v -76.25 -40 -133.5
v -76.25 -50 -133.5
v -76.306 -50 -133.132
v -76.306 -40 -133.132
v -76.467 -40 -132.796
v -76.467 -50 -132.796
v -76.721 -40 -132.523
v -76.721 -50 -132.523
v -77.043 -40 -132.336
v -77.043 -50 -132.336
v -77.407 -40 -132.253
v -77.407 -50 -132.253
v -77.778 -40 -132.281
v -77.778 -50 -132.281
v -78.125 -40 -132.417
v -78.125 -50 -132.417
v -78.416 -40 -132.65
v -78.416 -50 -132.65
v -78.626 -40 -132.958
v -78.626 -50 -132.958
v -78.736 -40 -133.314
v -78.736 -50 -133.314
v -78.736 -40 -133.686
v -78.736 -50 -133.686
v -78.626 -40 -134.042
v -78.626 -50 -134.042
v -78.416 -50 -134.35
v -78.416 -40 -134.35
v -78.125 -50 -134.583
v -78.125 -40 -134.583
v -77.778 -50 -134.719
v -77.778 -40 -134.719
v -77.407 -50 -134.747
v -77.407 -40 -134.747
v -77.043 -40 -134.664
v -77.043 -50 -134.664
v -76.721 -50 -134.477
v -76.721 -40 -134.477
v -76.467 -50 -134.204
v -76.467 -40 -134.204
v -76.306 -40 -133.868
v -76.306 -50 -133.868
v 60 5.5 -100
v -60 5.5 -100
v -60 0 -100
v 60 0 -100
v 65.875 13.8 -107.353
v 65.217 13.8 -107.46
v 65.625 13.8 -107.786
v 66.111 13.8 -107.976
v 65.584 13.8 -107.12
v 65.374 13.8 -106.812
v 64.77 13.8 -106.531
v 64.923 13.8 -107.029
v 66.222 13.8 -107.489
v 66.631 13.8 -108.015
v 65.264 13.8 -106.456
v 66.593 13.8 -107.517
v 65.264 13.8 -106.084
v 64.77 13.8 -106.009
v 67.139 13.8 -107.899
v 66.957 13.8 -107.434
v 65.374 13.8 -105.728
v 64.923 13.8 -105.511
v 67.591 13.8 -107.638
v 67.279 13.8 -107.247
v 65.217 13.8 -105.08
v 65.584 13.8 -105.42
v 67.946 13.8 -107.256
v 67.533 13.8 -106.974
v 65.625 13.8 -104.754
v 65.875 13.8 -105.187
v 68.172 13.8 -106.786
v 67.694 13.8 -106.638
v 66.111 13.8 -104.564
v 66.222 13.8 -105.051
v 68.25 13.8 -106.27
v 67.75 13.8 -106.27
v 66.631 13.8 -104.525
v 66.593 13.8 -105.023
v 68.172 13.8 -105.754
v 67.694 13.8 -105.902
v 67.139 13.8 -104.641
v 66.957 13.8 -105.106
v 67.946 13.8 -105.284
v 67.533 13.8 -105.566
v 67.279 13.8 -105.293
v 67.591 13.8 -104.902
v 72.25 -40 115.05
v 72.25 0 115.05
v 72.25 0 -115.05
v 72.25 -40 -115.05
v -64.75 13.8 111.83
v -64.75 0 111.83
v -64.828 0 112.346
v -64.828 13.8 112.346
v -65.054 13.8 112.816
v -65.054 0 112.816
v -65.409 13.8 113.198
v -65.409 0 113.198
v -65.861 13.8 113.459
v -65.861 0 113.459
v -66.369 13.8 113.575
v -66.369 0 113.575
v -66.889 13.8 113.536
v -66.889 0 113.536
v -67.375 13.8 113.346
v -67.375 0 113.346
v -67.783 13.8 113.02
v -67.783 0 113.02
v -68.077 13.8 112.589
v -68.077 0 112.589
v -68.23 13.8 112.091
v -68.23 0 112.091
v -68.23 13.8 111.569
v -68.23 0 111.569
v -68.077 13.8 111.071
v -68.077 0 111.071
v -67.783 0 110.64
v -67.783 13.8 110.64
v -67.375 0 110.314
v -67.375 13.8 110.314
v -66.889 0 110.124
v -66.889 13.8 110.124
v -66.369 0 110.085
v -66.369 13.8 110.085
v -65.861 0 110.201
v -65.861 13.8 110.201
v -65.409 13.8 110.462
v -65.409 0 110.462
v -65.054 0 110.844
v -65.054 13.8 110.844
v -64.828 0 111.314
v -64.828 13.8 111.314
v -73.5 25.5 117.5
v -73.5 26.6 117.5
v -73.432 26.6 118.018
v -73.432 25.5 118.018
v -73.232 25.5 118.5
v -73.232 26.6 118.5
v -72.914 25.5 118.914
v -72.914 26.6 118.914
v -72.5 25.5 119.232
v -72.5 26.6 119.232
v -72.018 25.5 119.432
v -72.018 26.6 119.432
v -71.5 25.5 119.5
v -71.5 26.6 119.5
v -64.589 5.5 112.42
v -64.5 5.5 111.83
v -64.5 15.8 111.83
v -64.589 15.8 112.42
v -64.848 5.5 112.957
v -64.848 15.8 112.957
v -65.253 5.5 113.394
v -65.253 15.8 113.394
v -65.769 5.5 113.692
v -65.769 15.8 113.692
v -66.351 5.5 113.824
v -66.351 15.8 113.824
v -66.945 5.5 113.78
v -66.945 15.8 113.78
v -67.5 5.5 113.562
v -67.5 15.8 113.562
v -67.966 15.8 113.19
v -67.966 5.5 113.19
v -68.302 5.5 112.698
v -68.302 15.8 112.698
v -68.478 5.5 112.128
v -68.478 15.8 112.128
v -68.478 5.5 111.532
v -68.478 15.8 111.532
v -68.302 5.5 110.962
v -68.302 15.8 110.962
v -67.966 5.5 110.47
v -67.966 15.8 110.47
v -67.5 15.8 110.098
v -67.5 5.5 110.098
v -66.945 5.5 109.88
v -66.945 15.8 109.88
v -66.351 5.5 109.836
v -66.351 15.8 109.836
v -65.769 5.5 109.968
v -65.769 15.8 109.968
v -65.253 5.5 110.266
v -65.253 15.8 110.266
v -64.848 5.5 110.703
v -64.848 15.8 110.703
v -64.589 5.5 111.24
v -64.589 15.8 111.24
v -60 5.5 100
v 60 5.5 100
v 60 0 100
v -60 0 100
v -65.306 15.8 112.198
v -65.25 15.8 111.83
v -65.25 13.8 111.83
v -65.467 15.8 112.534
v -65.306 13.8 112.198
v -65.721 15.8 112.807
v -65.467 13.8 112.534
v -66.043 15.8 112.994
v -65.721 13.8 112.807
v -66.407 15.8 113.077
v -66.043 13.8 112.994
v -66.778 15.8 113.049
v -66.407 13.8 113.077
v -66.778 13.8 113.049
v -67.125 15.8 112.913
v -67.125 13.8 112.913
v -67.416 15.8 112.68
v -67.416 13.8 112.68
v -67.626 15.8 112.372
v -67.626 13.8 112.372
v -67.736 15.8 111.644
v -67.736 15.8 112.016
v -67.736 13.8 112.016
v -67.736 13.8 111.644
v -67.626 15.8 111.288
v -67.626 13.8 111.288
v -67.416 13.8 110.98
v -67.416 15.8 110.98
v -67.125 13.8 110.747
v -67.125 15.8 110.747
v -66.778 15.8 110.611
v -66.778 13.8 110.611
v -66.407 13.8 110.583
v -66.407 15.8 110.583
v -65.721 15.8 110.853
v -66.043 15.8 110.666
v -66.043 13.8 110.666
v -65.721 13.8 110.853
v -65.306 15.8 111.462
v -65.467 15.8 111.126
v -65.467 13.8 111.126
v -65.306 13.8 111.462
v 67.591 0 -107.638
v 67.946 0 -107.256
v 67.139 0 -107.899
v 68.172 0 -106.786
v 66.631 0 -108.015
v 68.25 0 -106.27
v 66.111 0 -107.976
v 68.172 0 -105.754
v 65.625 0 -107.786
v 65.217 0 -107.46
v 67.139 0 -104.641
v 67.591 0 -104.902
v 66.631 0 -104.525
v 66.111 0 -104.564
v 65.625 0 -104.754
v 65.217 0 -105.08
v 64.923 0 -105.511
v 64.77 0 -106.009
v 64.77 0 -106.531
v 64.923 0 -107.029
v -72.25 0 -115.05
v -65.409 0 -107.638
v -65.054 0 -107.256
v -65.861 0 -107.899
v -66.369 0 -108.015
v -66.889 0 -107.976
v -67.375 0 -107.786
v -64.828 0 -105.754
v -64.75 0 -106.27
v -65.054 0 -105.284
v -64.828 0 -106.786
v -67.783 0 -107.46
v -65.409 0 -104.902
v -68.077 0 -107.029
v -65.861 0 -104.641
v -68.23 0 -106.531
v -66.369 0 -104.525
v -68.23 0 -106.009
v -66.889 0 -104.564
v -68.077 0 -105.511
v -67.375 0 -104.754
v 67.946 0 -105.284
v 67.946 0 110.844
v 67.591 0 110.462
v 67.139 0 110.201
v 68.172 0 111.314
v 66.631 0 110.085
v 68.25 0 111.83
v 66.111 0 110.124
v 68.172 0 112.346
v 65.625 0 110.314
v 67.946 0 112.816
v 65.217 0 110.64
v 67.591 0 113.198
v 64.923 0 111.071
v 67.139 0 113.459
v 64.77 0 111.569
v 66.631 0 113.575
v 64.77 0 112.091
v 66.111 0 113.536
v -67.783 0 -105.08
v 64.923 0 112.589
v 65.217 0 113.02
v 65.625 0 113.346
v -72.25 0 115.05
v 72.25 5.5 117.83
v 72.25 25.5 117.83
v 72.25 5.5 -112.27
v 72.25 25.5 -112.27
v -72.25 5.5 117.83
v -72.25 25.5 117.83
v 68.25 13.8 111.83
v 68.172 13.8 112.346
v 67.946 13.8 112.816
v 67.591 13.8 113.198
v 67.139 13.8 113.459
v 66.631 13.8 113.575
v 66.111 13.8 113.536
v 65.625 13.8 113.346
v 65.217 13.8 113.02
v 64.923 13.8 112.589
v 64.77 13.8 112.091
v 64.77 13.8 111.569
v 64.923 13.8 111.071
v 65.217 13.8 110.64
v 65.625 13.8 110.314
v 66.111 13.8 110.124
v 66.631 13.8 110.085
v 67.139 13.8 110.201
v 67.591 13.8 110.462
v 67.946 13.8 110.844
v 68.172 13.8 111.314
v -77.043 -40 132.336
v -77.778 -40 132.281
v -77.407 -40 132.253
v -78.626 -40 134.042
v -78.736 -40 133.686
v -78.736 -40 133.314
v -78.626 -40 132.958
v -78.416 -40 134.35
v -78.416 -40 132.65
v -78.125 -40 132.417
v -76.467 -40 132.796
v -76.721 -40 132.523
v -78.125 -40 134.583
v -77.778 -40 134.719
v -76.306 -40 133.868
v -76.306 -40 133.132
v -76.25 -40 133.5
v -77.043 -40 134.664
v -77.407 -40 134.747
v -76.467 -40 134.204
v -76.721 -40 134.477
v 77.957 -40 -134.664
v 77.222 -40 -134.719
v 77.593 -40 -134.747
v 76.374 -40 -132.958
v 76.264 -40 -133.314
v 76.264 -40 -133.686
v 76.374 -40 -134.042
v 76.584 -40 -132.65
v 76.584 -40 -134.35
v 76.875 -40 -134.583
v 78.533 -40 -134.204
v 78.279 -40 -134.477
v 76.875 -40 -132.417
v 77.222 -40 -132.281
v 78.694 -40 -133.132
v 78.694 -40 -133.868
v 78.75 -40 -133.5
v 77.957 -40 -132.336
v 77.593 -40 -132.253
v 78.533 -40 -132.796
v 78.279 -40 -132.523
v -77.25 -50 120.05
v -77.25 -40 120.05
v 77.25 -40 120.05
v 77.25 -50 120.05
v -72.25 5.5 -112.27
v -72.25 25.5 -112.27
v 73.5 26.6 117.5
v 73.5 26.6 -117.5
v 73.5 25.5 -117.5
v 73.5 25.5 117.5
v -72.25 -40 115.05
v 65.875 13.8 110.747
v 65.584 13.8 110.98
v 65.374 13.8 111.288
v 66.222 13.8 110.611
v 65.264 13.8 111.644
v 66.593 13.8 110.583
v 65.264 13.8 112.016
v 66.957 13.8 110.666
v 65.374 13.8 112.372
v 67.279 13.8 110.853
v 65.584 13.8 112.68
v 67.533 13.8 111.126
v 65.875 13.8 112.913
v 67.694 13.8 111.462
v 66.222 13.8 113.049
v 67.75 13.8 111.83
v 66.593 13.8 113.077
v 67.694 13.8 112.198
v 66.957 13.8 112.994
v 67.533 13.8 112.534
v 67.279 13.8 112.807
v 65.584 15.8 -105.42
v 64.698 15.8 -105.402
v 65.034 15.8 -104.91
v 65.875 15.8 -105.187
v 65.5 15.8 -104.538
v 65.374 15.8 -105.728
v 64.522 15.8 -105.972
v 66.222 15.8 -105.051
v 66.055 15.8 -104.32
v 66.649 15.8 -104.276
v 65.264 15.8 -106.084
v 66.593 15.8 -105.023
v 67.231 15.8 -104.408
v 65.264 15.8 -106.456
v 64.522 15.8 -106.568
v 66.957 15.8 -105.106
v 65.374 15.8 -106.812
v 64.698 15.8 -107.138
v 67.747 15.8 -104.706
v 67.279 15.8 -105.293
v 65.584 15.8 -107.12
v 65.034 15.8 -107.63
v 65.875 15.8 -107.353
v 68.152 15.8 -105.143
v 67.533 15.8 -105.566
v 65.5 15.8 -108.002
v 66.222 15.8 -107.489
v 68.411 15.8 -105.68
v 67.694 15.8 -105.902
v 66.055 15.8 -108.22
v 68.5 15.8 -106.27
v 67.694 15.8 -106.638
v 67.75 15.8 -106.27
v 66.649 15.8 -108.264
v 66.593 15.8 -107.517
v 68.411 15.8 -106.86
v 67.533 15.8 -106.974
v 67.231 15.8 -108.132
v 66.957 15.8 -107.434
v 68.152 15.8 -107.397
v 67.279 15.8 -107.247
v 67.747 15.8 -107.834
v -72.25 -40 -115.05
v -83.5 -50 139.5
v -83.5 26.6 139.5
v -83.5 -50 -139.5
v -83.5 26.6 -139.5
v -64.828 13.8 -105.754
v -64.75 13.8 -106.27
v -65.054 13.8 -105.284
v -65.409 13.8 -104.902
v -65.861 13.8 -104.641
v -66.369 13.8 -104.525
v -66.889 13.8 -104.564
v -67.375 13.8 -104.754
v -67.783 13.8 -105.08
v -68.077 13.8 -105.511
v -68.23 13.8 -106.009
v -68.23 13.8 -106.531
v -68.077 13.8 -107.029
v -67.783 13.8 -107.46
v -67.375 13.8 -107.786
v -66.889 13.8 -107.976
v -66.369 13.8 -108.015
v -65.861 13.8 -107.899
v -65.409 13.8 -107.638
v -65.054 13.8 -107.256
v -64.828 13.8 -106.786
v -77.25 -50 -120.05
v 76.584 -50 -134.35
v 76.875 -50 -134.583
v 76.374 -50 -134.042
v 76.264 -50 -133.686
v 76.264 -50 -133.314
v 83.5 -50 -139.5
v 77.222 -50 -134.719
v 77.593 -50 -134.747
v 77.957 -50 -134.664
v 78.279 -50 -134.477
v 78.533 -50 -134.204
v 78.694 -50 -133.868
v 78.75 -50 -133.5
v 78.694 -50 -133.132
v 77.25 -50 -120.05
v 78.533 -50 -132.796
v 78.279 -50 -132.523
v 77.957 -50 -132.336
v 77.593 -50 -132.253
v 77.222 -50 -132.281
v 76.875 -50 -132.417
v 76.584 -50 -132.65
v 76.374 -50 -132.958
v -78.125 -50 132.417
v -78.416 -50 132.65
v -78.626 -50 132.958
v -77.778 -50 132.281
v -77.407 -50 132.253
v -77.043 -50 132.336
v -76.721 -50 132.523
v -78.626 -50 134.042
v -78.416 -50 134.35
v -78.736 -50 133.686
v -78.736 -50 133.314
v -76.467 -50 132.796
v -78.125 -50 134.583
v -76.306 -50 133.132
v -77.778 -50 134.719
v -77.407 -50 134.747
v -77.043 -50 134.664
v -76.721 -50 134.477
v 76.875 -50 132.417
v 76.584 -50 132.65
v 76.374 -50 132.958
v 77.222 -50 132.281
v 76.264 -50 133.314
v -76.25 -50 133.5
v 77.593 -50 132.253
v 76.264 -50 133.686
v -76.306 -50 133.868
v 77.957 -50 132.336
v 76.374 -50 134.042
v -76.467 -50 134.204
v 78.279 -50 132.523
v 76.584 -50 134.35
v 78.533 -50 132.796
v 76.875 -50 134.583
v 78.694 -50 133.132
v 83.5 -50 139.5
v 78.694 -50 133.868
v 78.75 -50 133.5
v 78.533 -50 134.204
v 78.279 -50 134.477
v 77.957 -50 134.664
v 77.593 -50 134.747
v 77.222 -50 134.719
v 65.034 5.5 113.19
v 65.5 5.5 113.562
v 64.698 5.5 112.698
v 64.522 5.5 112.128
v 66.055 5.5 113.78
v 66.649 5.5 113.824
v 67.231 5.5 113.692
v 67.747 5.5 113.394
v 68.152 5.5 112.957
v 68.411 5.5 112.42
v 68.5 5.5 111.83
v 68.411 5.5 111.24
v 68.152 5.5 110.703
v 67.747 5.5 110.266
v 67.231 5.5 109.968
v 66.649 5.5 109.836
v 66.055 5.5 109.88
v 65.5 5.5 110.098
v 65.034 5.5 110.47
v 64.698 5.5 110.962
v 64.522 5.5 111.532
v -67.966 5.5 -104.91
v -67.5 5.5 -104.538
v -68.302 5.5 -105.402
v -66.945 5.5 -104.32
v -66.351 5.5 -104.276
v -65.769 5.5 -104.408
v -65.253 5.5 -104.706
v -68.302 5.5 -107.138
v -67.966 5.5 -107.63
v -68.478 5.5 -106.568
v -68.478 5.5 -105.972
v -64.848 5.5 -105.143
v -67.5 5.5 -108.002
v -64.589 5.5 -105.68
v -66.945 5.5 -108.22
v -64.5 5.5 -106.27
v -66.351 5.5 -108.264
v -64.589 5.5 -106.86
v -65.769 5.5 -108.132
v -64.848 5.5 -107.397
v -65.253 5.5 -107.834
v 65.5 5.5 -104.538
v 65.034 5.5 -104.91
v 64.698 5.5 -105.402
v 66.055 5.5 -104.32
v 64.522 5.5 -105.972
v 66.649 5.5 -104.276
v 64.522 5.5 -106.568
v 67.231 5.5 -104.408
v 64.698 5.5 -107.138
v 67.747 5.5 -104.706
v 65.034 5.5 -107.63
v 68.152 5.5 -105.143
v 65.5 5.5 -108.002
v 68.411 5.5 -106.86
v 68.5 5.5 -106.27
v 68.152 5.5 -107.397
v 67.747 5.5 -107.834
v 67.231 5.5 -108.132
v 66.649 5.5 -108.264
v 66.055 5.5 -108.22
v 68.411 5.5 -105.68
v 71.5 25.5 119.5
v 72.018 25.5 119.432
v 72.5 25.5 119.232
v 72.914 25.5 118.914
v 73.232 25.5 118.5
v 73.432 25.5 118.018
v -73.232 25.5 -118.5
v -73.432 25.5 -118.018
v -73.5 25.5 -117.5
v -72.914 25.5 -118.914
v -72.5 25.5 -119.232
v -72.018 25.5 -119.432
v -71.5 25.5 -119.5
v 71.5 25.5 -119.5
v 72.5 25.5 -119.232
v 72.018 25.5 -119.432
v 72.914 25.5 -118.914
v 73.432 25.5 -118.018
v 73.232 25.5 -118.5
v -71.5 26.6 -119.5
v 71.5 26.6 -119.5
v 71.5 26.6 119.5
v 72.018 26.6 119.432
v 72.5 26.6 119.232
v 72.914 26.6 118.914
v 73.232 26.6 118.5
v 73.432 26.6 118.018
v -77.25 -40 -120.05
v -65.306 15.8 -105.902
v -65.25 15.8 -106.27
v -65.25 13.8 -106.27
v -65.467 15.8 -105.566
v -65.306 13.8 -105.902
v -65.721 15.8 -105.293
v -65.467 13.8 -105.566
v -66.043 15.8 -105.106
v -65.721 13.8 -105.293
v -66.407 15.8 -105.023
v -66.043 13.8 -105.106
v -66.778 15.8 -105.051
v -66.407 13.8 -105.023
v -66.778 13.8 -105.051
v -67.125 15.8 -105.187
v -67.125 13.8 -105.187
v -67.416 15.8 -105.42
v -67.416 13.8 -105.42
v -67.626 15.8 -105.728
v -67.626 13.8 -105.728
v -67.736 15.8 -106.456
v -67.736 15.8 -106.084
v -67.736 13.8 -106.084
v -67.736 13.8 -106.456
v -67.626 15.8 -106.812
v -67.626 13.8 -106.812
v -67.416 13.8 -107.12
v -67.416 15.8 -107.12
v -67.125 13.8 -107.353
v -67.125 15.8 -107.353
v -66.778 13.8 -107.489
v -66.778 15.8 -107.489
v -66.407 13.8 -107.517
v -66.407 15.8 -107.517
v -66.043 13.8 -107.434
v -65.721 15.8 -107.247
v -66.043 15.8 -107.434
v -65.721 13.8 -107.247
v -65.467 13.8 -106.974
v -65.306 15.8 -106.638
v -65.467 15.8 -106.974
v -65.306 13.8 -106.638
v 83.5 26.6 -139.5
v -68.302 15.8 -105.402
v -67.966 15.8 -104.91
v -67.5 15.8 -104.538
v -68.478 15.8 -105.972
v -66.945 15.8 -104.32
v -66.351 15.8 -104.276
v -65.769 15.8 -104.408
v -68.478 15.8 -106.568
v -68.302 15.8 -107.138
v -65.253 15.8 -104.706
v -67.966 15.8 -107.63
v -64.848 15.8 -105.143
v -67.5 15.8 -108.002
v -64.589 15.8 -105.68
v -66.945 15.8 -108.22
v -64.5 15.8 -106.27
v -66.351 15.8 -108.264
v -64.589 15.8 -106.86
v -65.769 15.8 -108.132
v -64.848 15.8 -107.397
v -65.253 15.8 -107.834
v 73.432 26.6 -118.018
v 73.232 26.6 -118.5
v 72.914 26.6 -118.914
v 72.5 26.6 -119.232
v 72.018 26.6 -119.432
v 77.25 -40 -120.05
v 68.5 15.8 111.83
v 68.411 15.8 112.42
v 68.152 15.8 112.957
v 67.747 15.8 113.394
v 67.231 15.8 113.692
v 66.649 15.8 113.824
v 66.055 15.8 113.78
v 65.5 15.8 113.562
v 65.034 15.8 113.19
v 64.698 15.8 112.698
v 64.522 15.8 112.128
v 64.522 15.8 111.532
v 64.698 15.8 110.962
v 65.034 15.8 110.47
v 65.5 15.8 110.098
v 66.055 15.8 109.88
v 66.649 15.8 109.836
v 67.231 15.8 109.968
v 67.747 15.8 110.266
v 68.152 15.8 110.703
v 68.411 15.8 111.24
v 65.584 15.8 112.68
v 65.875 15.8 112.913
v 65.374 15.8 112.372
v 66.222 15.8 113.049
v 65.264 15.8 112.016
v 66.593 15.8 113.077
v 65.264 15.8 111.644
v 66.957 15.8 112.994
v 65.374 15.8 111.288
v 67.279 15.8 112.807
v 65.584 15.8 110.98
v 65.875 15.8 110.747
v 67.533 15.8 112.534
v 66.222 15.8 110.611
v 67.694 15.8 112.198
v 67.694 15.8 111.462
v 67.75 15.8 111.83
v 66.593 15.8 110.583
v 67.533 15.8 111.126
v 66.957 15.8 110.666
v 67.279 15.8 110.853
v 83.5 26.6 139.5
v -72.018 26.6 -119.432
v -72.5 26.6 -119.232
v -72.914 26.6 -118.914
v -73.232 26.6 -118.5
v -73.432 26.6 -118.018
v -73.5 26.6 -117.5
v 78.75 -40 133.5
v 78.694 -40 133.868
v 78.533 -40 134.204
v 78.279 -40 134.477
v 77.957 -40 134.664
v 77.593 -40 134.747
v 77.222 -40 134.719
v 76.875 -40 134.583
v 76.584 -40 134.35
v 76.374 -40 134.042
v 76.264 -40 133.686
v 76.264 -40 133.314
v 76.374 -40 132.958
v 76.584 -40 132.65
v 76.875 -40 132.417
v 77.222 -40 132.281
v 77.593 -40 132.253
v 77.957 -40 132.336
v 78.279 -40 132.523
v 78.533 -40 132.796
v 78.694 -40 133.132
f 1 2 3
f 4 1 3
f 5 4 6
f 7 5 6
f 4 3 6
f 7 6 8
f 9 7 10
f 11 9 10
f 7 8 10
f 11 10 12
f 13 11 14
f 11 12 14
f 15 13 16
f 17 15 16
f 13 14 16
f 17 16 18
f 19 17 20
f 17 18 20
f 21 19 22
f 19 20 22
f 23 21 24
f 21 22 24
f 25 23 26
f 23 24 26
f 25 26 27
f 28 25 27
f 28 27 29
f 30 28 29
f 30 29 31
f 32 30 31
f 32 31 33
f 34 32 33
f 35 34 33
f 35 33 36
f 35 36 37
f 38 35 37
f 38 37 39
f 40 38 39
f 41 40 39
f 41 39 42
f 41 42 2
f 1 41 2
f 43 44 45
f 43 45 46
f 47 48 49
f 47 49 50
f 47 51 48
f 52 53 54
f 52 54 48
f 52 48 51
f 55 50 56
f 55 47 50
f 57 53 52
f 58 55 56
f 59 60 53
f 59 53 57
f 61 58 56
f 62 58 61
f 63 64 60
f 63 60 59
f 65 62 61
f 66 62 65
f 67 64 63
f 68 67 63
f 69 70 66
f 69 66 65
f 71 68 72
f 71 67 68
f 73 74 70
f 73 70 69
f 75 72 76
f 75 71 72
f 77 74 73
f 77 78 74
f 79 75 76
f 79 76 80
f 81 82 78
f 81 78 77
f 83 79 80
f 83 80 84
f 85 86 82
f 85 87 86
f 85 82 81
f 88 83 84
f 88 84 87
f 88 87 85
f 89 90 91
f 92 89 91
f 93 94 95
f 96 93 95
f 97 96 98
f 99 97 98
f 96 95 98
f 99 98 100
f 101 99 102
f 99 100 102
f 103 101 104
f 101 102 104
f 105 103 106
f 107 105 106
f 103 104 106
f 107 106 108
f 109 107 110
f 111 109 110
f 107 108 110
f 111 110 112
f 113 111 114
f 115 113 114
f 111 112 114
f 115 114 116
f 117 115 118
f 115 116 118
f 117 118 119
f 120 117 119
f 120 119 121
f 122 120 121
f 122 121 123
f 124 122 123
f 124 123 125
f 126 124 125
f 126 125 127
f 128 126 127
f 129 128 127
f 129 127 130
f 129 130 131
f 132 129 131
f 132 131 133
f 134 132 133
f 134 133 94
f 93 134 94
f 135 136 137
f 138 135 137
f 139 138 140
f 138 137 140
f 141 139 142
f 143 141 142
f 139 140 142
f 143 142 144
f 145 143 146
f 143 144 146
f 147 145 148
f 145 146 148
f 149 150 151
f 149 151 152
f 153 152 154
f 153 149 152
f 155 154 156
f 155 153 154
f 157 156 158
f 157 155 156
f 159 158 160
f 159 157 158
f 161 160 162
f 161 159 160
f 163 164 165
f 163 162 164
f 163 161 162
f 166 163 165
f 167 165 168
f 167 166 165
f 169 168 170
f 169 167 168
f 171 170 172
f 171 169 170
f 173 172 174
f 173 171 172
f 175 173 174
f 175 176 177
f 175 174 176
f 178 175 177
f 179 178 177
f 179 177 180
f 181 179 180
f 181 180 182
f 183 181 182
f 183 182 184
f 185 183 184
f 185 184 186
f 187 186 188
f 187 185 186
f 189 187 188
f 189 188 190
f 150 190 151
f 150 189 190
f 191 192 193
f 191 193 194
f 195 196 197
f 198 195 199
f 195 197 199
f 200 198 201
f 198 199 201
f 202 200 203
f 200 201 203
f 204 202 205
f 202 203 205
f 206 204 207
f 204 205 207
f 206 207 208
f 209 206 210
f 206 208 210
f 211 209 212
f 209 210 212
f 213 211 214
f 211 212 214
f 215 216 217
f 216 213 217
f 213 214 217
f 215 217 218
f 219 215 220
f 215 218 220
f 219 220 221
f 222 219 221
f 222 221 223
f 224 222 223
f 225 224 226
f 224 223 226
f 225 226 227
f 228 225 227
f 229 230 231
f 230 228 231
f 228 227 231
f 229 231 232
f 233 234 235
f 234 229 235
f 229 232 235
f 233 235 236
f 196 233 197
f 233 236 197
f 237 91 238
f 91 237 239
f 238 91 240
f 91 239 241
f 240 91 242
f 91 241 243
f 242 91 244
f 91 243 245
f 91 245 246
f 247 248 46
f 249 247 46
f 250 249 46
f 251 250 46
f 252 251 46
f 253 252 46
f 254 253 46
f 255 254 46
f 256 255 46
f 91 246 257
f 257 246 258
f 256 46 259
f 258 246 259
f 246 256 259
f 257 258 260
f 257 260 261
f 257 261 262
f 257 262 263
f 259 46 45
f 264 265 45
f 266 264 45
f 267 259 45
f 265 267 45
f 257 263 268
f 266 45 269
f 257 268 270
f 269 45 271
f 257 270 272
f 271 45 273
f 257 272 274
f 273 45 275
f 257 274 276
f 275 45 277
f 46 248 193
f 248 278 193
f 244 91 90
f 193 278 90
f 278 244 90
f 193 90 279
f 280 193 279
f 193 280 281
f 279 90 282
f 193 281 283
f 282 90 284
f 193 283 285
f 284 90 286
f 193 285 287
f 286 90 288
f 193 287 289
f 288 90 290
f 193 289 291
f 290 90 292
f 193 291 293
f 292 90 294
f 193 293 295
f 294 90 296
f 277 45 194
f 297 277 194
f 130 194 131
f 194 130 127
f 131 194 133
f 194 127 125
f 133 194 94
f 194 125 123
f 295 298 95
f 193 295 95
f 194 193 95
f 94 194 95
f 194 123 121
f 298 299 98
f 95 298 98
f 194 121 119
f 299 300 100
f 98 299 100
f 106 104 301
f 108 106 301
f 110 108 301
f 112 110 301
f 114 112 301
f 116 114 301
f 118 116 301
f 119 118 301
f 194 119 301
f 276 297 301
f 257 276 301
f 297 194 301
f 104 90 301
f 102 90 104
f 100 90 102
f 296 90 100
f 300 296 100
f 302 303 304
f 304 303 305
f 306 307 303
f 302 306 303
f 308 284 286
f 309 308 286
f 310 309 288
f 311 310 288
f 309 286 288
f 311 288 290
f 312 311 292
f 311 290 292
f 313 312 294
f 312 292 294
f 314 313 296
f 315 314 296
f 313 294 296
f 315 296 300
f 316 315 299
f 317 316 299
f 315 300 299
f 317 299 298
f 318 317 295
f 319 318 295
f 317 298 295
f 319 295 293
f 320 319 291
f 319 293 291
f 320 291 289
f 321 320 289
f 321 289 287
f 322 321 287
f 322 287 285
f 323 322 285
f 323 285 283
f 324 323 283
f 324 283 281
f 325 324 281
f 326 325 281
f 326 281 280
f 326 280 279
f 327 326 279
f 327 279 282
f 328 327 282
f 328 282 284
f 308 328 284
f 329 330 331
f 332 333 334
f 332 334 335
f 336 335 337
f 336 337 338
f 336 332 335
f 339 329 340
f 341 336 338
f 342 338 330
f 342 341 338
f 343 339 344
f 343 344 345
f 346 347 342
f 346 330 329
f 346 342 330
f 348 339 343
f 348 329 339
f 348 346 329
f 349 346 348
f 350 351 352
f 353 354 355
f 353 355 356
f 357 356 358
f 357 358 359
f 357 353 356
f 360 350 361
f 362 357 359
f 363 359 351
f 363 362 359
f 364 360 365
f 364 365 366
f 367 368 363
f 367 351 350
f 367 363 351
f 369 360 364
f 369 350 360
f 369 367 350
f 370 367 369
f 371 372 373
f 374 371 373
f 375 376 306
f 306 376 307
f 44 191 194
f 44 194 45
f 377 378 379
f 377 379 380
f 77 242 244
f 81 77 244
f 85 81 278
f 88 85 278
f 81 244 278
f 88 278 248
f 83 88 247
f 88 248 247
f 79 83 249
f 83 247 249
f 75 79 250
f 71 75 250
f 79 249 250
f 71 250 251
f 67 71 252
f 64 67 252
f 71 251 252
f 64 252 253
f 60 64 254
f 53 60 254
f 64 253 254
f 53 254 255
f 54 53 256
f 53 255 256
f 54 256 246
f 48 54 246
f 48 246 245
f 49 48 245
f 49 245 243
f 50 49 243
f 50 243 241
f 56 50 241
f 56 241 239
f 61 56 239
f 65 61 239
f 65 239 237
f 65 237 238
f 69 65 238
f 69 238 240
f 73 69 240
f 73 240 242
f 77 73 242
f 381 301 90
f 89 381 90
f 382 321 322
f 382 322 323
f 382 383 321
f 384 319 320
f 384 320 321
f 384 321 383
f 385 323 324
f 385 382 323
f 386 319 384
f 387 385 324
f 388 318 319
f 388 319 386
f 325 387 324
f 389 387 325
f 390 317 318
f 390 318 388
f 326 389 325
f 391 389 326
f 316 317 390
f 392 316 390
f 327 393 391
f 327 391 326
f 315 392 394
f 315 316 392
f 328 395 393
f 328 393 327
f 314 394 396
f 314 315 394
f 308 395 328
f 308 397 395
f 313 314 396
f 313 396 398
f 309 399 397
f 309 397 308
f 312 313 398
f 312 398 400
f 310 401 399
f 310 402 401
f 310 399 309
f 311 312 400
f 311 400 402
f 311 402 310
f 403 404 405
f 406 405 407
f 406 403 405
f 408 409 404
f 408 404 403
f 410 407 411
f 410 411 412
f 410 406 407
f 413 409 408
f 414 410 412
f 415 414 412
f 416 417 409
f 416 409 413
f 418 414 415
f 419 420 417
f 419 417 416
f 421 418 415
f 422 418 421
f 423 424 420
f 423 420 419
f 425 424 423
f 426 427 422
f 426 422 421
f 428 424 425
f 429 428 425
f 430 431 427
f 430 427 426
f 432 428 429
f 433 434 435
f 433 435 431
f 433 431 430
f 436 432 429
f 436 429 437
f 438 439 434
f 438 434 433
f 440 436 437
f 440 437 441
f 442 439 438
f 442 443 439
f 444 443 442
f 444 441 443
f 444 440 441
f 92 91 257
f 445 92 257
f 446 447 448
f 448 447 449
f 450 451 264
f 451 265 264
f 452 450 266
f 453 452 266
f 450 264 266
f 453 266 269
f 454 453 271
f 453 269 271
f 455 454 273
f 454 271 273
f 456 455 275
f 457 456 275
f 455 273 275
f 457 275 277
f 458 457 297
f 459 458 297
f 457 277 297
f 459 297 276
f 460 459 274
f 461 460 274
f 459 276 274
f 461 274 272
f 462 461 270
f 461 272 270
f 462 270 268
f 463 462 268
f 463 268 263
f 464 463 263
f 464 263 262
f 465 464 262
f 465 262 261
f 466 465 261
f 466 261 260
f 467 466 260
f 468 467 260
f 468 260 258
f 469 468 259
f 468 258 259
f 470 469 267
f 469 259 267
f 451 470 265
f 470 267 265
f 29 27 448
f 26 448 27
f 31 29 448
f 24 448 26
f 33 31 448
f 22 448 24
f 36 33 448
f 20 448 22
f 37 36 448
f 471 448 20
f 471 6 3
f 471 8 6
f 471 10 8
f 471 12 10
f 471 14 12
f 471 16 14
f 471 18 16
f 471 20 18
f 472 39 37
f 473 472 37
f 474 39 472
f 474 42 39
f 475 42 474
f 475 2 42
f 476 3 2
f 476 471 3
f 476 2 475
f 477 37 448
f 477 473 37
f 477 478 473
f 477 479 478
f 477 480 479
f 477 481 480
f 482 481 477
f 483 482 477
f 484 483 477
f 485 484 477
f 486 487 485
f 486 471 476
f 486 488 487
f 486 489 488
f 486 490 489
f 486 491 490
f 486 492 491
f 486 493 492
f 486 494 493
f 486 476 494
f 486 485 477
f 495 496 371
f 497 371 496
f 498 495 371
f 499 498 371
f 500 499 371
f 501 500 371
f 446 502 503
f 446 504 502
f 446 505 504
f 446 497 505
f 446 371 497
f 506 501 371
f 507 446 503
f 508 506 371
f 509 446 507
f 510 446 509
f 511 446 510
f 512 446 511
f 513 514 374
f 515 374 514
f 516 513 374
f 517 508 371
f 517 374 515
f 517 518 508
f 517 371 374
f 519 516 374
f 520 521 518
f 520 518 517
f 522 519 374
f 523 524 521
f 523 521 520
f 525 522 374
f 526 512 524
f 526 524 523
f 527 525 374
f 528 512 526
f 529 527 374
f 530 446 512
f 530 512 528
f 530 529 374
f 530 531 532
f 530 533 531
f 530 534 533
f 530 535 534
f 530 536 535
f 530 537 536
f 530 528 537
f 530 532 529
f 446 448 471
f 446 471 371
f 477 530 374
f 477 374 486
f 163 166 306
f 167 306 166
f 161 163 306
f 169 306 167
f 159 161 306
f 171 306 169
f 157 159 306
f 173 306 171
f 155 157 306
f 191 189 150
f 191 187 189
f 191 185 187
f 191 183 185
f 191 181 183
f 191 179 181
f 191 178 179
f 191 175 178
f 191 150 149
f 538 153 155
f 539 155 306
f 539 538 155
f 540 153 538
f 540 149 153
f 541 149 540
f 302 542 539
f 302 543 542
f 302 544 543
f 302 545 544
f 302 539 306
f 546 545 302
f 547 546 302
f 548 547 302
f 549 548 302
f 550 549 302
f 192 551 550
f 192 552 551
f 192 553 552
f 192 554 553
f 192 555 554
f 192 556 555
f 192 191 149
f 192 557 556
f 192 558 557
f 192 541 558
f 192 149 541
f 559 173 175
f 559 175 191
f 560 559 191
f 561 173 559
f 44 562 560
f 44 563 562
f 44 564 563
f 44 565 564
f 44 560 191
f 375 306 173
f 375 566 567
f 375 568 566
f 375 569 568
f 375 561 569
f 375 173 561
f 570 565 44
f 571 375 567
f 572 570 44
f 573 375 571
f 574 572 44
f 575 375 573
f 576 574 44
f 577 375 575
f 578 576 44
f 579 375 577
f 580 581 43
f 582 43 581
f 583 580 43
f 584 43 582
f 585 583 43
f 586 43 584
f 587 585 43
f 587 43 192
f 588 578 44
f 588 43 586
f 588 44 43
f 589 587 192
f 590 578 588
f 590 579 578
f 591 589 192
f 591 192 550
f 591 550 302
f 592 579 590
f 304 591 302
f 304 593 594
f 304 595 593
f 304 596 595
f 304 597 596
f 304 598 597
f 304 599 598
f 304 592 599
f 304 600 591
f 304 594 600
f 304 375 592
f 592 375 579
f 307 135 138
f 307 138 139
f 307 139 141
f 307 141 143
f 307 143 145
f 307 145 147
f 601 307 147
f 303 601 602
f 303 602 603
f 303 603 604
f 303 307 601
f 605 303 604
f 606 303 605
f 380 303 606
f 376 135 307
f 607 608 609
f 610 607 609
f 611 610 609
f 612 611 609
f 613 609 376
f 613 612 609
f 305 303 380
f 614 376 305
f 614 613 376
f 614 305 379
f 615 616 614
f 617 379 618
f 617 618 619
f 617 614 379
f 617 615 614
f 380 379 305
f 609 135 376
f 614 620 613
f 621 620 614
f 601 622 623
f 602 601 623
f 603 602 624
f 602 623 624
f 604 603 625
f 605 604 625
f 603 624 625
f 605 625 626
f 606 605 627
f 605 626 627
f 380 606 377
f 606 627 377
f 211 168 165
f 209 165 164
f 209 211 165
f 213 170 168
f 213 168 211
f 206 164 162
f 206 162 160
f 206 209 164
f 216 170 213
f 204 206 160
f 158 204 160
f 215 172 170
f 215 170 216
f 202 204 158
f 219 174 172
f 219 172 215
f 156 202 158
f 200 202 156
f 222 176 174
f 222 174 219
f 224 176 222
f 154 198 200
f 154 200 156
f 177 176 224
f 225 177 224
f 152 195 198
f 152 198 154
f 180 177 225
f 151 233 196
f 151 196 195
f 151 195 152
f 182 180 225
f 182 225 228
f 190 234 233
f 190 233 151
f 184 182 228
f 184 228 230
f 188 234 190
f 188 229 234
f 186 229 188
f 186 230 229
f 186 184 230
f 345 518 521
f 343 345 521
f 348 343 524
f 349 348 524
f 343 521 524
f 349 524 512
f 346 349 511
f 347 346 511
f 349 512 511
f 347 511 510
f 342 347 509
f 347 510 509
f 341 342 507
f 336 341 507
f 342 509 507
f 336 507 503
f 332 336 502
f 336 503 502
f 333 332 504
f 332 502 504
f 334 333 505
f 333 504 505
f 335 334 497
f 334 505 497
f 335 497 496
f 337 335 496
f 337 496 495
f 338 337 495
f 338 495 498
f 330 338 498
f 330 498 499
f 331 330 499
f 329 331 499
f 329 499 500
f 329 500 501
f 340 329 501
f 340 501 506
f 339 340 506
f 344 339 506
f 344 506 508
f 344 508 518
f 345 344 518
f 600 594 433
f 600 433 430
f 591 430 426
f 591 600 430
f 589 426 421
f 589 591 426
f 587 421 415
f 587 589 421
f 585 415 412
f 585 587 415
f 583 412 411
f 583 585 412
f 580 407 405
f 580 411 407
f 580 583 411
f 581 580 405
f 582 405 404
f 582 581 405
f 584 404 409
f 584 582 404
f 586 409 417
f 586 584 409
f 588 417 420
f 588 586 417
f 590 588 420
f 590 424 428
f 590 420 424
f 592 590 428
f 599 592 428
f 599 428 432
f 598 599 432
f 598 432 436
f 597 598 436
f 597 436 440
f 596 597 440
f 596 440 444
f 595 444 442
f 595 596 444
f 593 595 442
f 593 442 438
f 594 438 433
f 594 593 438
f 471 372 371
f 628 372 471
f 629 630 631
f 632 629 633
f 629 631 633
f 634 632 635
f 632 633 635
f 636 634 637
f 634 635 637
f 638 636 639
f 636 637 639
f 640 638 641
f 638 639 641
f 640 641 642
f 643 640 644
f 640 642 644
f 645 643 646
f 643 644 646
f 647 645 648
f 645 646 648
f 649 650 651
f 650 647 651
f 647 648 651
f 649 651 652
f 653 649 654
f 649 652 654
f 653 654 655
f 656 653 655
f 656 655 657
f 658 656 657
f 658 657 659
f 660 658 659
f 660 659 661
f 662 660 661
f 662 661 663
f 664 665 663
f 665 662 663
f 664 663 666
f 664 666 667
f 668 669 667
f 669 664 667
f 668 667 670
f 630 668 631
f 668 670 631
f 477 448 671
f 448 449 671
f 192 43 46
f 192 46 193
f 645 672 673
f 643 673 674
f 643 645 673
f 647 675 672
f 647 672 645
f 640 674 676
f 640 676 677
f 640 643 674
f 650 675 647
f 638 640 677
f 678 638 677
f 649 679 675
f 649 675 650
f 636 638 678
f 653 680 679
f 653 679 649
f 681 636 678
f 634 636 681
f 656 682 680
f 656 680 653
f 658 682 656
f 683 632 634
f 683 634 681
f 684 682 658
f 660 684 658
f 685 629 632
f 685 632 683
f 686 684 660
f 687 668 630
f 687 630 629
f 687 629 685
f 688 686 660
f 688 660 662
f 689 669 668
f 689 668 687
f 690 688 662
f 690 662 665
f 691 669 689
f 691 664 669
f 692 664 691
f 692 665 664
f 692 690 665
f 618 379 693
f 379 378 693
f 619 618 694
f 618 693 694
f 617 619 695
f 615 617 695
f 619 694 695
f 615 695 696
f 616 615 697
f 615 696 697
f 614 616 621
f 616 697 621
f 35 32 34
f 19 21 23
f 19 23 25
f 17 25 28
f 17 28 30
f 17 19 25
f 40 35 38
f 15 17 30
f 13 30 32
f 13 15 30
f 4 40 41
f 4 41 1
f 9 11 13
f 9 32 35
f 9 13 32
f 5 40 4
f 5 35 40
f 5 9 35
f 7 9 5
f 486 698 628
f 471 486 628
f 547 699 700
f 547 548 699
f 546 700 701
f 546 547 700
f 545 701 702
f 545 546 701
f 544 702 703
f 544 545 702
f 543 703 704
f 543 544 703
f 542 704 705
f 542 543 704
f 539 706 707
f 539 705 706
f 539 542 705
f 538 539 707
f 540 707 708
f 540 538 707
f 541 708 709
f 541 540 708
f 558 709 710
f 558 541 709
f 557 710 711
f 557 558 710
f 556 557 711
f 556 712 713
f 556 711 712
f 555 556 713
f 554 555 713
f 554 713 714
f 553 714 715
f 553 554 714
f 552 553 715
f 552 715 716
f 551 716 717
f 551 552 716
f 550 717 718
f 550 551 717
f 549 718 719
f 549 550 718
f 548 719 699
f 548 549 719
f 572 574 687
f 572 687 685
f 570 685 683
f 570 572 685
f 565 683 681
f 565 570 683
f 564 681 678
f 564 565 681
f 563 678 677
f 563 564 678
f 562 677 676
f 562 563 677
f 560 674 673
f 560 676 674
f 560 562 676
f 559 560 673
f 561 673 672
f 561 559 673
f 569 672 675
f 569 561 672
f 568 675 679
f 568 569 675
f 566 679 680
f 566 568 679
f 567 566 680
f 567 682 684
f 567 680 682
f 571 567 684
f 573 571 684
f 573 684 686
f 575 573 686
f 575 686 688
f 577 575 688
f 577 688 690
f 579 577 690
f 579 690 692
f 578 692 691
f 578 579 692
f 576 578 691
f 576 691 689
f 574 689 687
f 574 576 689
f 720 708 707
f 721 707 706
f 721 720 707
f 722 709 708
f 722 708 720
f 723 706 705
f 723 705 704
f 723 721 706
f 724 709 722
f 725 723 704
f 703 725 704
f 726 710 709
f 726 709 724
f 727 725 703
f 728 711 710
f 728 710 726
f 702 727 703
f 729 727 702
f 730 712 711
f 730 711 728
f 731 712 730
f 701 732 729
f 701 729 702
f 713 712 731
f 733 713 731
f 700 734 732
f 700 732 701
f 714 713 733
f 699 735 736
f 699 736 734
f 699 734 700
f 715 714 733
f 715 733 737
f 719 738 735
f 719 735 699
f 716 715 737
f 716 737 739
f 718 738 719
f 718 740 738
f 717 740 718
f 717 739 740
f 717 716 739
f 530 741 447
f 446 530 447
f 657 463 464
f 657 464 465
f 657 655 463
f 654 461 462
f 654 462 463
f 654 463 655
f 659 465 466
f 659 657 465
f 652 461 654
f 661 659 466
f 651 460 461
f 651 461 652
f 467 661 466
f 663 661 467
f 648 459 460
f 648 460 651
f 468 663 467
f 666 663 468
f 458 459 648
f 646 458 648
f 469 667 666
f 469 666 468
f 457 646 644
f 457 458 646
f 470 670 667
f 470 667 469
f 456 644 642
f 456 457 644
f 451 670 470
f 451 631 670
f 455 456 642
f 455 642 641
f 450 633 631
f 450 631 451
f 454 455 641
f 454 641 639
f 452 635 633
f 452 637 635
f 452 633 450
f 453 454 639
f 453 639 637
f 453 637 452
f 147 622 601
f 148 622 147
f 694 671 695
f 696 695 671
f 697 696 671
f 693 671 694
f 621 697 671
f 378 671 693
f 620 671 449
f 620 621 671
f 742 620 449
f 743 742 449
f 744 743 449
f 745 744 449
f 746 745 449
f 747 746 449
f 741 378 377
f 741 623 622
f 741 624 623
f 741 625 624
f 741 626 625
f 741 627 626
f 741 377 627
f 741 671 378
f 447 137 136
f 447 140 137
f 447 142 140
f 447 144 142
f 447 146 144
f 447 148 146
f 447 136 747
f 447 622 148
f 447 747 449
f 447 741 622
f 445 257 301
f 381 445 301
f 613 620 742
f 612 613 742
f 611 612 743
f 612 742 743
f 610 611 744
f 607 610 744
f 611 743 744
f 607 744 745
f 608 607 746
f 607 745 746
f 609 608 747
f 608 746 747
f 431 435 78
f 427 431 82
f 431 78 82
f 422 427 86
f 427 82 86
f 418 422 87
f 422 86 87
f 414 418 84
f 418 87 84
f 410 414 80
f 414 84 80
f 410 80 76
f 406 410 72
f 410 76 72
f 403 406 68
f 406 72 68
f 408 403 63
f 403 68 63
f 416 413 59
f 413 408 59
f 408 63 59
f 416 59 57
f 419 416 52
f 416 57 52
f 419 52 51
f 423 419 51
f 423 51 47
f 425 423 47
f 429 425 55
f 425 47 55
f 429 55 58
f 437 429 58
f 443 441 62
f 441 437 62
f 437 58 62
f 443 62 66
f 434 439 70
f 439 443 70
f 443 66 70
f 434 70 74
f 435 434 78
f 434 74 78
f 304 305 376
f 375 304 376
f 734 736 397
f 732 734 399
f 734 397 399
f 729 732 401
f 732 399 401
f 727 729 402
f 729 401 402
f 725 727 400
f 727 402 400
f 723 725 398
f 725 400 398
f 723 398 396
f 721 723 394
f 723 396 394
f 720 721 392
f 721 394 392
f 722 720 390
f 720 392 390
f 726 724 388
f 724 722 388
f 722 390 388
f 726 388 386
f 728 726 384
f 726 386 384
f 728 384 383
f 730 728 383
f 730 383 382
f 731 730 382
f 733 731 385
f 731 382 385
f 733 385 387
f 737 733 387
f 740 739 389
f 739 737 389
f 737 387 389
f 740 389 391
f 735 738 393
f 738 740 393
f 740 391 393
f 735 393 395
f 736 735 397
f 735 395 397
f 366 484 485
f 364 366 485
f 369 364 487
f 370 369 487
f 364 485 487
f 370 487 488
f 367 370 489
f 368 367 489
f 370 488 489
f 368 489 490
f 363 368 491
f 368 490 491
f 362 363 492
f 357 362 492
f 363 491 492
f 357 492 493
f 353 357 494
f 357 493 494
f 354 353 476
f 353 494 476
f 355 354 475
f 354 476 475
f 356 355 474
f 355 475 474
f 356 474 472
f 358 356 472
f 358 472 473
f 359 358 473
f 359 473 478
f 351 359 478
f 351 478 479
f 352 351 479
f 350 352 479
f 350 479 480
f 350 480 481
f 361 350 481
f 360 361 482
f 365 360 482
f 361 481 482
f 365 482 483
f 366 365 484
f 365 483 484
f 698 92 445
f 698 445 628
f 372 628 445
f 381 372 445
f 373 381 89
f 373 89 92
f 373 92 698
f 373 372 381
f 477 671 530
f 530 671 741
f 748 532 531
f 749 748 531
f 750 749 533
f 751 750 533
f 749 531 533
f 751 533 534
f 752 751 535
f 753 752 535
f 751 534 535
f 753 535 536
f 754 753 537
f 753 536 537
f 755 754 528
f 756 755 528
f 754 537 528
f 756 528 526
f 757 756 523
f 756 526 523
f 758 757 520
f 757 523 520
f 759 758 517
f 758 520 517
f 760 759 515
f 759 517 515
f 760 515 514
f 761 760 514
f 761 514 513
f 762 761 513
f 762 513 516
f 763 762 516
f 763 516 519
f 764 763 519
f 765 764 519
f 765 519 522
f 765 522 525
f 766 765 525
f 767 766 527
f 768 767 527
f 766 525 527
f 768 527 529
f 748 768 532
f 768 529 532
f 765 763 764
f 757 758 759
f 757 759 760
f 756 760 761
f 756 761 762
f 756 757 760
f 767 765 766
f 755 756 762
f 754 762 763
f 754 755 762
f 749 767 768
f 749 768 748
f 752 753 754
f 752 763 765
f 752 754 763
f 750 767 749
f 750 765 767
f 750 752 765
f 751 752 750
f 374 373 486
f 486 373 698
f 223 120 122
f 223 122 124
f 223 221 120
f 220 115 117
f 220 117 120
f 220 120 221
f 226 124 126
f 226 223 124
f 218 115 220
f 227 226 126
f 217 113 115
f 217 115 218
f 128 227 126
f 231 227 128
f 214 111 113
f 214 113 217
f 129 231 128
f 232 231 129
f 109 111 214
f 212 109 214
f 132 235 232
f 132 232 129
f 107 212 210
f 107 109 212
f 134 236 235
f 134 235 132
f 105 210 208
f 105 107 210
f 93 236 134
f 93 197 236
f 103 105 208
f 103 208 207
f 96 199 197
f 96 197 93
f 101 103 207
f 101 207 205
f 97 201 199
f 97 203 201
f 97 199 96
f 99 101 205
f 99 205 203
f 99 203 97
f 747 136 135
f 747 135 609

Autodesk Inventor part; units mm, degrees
ref_plane "YZ Plane" through (0, 0, 0) normal (1, 0, 0) x (0, 1, 0)
ref_plane "XZ Plane" through (0, 0, 0) normal (0, 1, 0) x (-1, 0, 0)
ref_plane "XY Plane" through (0, 0, 0) normal (0, 0, 1) x (1, 0, 0)
sketch "Sketch1" plane through (0, 0, 0) normal (0, 1, 0) x (-1, 0, 0)
  line L0 (-83.5, 139.5) -> (83.5, 139.5)
  line L1 (83.5, 139.5) -> (83.5, -139.5)
  line L2 (83.5, -139.5) -> (-83.5, -139.5)
  line L3 (-83.5, -139.5) -> (-83.5, 139.5)
  line L4 (-83.5, 139.5) -> (83.5, -139.5) construction
  line L5 (83.5, 139.5) -> (-83.5, -139.5) construction
  point P0 (0, 0)
  dimension "d0" = 167
  dimension "d1" = 279
extrude "Extrusion1" add sketch "Sketch1" along normal blind 26.6
sketch "Sketch2" plane through (0, 26.6, 0) normal (0, 1, 0) x (1, 0, 0)
  line L0 (71.5, -119.5) -> (-71.5, -119.5)
  line L1 (-73.5, -117.5) -> (-73.5, 117.5)
  line L2 (-71.5, 119.5) -> (71.5, 119.5)
  line L3 (73.5, 117.5) -> (73.5, -117.5)
  line L4 (73.5, -119.5) -> (-73.5, 119.5) construction
  line L5 (-73.5, -119.5) -> (73.5, 119.5) construction
  arc A0 (-73.5, -117.5) -> (-71.5, -119.5) centre (-71.5, -117.5) ccw
  arc A1 (-71.5, 119.5) -> (-73.5, 117.5) centre (-71.5, 117.5) ccw
  arc A2 (73.5, 117.5) -> (71.5, 119.5) centre (71.5, 117.5) ccw
  arc A3 (71.5, -119.5) -> (73.5, -117.5) centre (71.5, -117.5) ccw
  point P0 (0, 0)
  dimension "d4" = 147
  dimension "d5" = 239
  dimension "d6" = 2
extrude "Extrusion2" cut sketch "Sketch2" against normal blind 1.1
sketch "Sketch3" plane through (0, 25.5, 0) normal (0, 1, 0) x (1, 0, 0)
  line L0 (-73.5, -117.5) -> (-73.5, 117.5) projected
  line L1 (71.5, -119.5) -> (-71.5, -119.5) projected
  line L2 (-72.25, -117.83) -> (72.25, -117.83)
  line L3 (72.25, -117.83) -> (72.25, 112.27)
  line L4 (72.25, 112.27) -> (-72.25, 112.27)
  line L5 (-72.25, 112.27) -> (-72.25, -117.83)
  point P0 (0, 0)
  dimension "d9" = 1.25
  dimension "d10" = 1.67
  dimension "d11" = 144.5
  dimension "d12" = 230.1
extrude "Extrusion3" cut sketch "Sketch3" against normal blind 20
sketch "Sketch4" plane through (0, 5.5, 0) normal (0, 1, 0) x (1, 0, 0)
  circle A0 centre (-66.5, -111.83) radius 2
  line L0 (72.25, -117.83) -> (-72.25, -117.83) projected
  line L1 (-72.25, -117.83) -> (-72.25, 112.27) projected
  circle A1 centre (66.5, -111.83) radius 2
  line L2 (72.25, 112.27) -> (72.25, -117.83) projected
  circle A2 centre (-66.5, 106.27) radius 2
  line L3 (-72.25, 112.27) -> (72.25, 112.27) projected
  circle A3 centre (66.5, 106.27) radius 2
  point P0 (0, 0)
  dimension "d15" = 4
  dimension "d16" = 6
  dimension "d17" = 5.75
  dimension "d18" = 4
  dimension "d19" = 6
  dimension "d20" = 5.75
  dimension "d21" = 4
  dimension "d22" = 5.75
  dimension "d23" = 6
  dimension "d24" = 4
  dimension "d25" = 6
  dimension "d26" = 5.75
extrude "Extrusion4" add sketch "Sketch4" along normal blind 10.3 contours A0 | A1 | A2 | A3
sketch "Sketch5" plane through (0, 5.5, 0) normal (0, 1, 0) x (1, 0, 0)
  circle A0 centre (-66.5, -111.83) radius 2 projected
  circle A1 centre (-66.5, -111.83) radius 1.25
  circle A2 centre (-66.5, 106.27) radius 2 projected
  circle A3 centre (-66.5, 106.27) radius 1.25
  circle A4 centre (66.5, 106.27) radius 2 projected
  circle A5 centre (66.5, 106.27) radius 1.25
  circle A6 centre (66.5, -111.83) radius 1.25
  point P0 (0, 0)
  dimension "d29" = 2.5
  dimension "d30" = 2.5
  dimension "d31" = 2.5
  dimension "d32" = 2.5
extrude "Extrusion5" cut sketch "Sketch5" along normal blind 10.3 and the other way blind 5.5 contours A1 | A3 | A5 | A6
sketch "Sketch8" plane through (0, 0, 0) normal (0, -1, 0) x (1, 0, 0)
  circle A0 centre (66.5, 111.83) radius 1.25 projected
  circle A1 centre (66.5, 111.83) radius 1.75
  circle A2 centre (66.5, -106.27) radius 1.25 projected
  circle A3 centre (66.5, -106.27) radius 1.75
  circle A4 centre (-66.5, -106.27) radius 1.25 projected
  circle A5 centre (-66.5, -106.27) radius 1.75
  circle A6 centre (-66.5, 111.83) radius 1.75
  point P0 (0, 0)
  dimension "d49" = 3.5
  dimension "d50" = 3.5
  dimension "d51" = 3.5
  dimension "d52" = 3.5
extrude "Extrusion8" cut sketch "Sketch8" against normal blind 13.8
sketch "Sketch9" plane through (0, 5.5, 0) normal (0, 1, 0) x (1, 0, 0)
  line L0 (60, -100) -> (-60, -100)
  line L1 (-60, -100) -> (-60, 100)
  line L2 (-60, 100) -> (60, 100)
  line L3 (60, 100) -> (60, -100)
  line L4 (60, -100) -> (-60, 100) construction
  line L5 (-60, -100) -> (60, 100) construction
  point P0 (0, 0)
  dimension "d55" = 120
  dimension "d56" = 200
extrude "Extrusion9" cut sketch "Sketch9" against normal blind 5.8
sketch "Sketch10" plane through (0, 0, 0) normal (0, -1, 0) x (1, 0, 0)
  line L0 (83.5, 139.5) -> (83.5, -139.5) projected
  line L1 (-83.5, -139.5) -> (-83.5, 139.5) projected
  line L2 (83.5, 139.5) -> (-83.5, 139.5)
  line L3 (-83.5, 139.5) -> (-83.5, -139.5)
  line L4 (-83.5, -139.5) -> (83.5, -139.5)
  line L5 (83.5, -139.5) -> (83.5, 139.5)
  line L6 (72.25, -115.05) -> (-72.25, -115.05)
  line L7 (-72.25, -115.05) -> (-72.25, 115.05)
  line L8 (-72.25, 115.05) -> (72.25, 115.05)
  line L9 (72.25, 115.05) -> (72.25, -115.05)
  line L10 (72.25, -115.05) -> (-72.25, 115.05) construction
  line L11 (-72.25, -115.05) -> (72.25, 115.05) construction
  line L12 (-83.5, -139.5) -> (83.5, -139.5)
  line L13 (83.5, -139.5) -> (83.5, 139.5)
  line L14 (83.5, 139.5) -> (-83.5, 139.5)
  line L15 (-83.5, 139.5) -> (-83.5, -139.5)
  point P0 (0, 0)
  point P1 (71.5, 119.5)
  dimension "d67" = 144.5
  dimension "d68" = 230.1
extrude "Extrusion10" add sketch "Sketch10" along normal blind 40
sketch "Sketch12" plane through (0, -40, 0) normal (0, -1, 0) x (1, 0, 0)
  line L0 (-72.25, -115.05) -> (-72.25, 115.05) projected
  line L1 (72.25, -115.05) -> (-72.25, -115.05) projected
  line L2 (-77.25, -120.05) -> (-72.25, -120.05)
  line L3 (-72.25, -120.05) -> (-72.25, 120.05)
  line L4 (-72.25, 120.05) -> (-77.25, 120.05)
  line L5 (-77.25, 120.05) -> (-77.25, -120.05)
  line L6 (72.25, 115.05) -> (72.25, -115.05) projected
  line L7 (77.25, -120.05) -> (72.25, -120.05)
  line L8 (72.25, -120.05) -> (72.25, 120.05)
  line L9 (72.25, 120.05) -> (77.25, 120.05)
  line L10 (77.25, 120.05) -> (77.25, -120.05)
  line L11 (72.25, 115.05) -> (-72.25, 115.05) projected
  line L12 (72.25, 120.05) -> (-72.25, 120.05)
  line L13 (-72.25, 120.05) -> (-72.25, 115.05)
  line L14 (-72.25, 115.05) -> (72.25, 115.05)
  line L15 (72.25, 115.05) -> (72.25, 120.05)
  line L16 (-83.5, 139.5) -> (-83.5, -139.5) projected
  line L17 (83.5, 139.5) -> (-83.5, 139.5) projected
  line L18 (-83.5, -139.5) -> (83.5, -139.5)
  line L19 (83.5, -139.5) -> (83.5, 139.5)
  line L20 (83.5, 139.5) -> (-83.5, 139.5)
  line L21 (-83.5, 139.5) -> (-83.5, -139.5)
  line L22 (-72.25, -115.05) -> (72.25, -115.05) projected
  line L23 (-72.25, -115.05) -> (72.25, -115.05)
  line L24 (72.25, -115.05) -> (72.25, -120.05)
  line L25 (72.25, -120.05) -> (-72.25, -120.05)
  line L26 (-72.25, -120.05) -> (-72.25, -115.05)
  point P0 (0, 0)
  dimension "d69" = 5
  dimension "d70" = 5
  dimension "d71" = 240.1
  dimension "d72" = 5
  dimension "d73" = 5
  dimension "d74" = 240.1
extrude "Extrusion11" add sketch "Sketch12" along normal blind 10
sketch "Sketch13" plane through (0, -50, 0) normal (0, -1, 0) x (1, 0, 0)
  circle A0 centre (-77.5, -133.5) radius 1.25
  line L0 (-83.5, 139.5) -> (-83.5, -139.5) projected
  line L1 (-83.5, -139.5) -> (83.5, -139.5) projected
  circle A1 centre (-77.5, 133.5) radius 1.25
  line L2 (83.5, 139.5) -> (-83.5, 139.5) projected
  circle A2 centre (77.5, 133.5) radius 1.25
  line L3 (83.5, -139.5) -> (83.5, 139.5) projected
  circle A3 centre (77.5, -133.5) radius 1.25
  point P0 (0, 0)
  dimension "d77" = 2.5
  dimension "d78" = 6
  dimension "d79" = 6
  dimension "d80" = 2.5
  dimension "d81" = 6
  dimension "d82" = 6
  dimension "d83" = 2.5
  dimension "d84" = 6
  dimension "d85" = 6
  dimension "d86" = 6
  dimension "d87" = 6
extrude "Extrusion12" cut sketch "Sketch13" against normal blind 10 contours A0 | A1 | A2 | A3
properties part number "Enclosure"
